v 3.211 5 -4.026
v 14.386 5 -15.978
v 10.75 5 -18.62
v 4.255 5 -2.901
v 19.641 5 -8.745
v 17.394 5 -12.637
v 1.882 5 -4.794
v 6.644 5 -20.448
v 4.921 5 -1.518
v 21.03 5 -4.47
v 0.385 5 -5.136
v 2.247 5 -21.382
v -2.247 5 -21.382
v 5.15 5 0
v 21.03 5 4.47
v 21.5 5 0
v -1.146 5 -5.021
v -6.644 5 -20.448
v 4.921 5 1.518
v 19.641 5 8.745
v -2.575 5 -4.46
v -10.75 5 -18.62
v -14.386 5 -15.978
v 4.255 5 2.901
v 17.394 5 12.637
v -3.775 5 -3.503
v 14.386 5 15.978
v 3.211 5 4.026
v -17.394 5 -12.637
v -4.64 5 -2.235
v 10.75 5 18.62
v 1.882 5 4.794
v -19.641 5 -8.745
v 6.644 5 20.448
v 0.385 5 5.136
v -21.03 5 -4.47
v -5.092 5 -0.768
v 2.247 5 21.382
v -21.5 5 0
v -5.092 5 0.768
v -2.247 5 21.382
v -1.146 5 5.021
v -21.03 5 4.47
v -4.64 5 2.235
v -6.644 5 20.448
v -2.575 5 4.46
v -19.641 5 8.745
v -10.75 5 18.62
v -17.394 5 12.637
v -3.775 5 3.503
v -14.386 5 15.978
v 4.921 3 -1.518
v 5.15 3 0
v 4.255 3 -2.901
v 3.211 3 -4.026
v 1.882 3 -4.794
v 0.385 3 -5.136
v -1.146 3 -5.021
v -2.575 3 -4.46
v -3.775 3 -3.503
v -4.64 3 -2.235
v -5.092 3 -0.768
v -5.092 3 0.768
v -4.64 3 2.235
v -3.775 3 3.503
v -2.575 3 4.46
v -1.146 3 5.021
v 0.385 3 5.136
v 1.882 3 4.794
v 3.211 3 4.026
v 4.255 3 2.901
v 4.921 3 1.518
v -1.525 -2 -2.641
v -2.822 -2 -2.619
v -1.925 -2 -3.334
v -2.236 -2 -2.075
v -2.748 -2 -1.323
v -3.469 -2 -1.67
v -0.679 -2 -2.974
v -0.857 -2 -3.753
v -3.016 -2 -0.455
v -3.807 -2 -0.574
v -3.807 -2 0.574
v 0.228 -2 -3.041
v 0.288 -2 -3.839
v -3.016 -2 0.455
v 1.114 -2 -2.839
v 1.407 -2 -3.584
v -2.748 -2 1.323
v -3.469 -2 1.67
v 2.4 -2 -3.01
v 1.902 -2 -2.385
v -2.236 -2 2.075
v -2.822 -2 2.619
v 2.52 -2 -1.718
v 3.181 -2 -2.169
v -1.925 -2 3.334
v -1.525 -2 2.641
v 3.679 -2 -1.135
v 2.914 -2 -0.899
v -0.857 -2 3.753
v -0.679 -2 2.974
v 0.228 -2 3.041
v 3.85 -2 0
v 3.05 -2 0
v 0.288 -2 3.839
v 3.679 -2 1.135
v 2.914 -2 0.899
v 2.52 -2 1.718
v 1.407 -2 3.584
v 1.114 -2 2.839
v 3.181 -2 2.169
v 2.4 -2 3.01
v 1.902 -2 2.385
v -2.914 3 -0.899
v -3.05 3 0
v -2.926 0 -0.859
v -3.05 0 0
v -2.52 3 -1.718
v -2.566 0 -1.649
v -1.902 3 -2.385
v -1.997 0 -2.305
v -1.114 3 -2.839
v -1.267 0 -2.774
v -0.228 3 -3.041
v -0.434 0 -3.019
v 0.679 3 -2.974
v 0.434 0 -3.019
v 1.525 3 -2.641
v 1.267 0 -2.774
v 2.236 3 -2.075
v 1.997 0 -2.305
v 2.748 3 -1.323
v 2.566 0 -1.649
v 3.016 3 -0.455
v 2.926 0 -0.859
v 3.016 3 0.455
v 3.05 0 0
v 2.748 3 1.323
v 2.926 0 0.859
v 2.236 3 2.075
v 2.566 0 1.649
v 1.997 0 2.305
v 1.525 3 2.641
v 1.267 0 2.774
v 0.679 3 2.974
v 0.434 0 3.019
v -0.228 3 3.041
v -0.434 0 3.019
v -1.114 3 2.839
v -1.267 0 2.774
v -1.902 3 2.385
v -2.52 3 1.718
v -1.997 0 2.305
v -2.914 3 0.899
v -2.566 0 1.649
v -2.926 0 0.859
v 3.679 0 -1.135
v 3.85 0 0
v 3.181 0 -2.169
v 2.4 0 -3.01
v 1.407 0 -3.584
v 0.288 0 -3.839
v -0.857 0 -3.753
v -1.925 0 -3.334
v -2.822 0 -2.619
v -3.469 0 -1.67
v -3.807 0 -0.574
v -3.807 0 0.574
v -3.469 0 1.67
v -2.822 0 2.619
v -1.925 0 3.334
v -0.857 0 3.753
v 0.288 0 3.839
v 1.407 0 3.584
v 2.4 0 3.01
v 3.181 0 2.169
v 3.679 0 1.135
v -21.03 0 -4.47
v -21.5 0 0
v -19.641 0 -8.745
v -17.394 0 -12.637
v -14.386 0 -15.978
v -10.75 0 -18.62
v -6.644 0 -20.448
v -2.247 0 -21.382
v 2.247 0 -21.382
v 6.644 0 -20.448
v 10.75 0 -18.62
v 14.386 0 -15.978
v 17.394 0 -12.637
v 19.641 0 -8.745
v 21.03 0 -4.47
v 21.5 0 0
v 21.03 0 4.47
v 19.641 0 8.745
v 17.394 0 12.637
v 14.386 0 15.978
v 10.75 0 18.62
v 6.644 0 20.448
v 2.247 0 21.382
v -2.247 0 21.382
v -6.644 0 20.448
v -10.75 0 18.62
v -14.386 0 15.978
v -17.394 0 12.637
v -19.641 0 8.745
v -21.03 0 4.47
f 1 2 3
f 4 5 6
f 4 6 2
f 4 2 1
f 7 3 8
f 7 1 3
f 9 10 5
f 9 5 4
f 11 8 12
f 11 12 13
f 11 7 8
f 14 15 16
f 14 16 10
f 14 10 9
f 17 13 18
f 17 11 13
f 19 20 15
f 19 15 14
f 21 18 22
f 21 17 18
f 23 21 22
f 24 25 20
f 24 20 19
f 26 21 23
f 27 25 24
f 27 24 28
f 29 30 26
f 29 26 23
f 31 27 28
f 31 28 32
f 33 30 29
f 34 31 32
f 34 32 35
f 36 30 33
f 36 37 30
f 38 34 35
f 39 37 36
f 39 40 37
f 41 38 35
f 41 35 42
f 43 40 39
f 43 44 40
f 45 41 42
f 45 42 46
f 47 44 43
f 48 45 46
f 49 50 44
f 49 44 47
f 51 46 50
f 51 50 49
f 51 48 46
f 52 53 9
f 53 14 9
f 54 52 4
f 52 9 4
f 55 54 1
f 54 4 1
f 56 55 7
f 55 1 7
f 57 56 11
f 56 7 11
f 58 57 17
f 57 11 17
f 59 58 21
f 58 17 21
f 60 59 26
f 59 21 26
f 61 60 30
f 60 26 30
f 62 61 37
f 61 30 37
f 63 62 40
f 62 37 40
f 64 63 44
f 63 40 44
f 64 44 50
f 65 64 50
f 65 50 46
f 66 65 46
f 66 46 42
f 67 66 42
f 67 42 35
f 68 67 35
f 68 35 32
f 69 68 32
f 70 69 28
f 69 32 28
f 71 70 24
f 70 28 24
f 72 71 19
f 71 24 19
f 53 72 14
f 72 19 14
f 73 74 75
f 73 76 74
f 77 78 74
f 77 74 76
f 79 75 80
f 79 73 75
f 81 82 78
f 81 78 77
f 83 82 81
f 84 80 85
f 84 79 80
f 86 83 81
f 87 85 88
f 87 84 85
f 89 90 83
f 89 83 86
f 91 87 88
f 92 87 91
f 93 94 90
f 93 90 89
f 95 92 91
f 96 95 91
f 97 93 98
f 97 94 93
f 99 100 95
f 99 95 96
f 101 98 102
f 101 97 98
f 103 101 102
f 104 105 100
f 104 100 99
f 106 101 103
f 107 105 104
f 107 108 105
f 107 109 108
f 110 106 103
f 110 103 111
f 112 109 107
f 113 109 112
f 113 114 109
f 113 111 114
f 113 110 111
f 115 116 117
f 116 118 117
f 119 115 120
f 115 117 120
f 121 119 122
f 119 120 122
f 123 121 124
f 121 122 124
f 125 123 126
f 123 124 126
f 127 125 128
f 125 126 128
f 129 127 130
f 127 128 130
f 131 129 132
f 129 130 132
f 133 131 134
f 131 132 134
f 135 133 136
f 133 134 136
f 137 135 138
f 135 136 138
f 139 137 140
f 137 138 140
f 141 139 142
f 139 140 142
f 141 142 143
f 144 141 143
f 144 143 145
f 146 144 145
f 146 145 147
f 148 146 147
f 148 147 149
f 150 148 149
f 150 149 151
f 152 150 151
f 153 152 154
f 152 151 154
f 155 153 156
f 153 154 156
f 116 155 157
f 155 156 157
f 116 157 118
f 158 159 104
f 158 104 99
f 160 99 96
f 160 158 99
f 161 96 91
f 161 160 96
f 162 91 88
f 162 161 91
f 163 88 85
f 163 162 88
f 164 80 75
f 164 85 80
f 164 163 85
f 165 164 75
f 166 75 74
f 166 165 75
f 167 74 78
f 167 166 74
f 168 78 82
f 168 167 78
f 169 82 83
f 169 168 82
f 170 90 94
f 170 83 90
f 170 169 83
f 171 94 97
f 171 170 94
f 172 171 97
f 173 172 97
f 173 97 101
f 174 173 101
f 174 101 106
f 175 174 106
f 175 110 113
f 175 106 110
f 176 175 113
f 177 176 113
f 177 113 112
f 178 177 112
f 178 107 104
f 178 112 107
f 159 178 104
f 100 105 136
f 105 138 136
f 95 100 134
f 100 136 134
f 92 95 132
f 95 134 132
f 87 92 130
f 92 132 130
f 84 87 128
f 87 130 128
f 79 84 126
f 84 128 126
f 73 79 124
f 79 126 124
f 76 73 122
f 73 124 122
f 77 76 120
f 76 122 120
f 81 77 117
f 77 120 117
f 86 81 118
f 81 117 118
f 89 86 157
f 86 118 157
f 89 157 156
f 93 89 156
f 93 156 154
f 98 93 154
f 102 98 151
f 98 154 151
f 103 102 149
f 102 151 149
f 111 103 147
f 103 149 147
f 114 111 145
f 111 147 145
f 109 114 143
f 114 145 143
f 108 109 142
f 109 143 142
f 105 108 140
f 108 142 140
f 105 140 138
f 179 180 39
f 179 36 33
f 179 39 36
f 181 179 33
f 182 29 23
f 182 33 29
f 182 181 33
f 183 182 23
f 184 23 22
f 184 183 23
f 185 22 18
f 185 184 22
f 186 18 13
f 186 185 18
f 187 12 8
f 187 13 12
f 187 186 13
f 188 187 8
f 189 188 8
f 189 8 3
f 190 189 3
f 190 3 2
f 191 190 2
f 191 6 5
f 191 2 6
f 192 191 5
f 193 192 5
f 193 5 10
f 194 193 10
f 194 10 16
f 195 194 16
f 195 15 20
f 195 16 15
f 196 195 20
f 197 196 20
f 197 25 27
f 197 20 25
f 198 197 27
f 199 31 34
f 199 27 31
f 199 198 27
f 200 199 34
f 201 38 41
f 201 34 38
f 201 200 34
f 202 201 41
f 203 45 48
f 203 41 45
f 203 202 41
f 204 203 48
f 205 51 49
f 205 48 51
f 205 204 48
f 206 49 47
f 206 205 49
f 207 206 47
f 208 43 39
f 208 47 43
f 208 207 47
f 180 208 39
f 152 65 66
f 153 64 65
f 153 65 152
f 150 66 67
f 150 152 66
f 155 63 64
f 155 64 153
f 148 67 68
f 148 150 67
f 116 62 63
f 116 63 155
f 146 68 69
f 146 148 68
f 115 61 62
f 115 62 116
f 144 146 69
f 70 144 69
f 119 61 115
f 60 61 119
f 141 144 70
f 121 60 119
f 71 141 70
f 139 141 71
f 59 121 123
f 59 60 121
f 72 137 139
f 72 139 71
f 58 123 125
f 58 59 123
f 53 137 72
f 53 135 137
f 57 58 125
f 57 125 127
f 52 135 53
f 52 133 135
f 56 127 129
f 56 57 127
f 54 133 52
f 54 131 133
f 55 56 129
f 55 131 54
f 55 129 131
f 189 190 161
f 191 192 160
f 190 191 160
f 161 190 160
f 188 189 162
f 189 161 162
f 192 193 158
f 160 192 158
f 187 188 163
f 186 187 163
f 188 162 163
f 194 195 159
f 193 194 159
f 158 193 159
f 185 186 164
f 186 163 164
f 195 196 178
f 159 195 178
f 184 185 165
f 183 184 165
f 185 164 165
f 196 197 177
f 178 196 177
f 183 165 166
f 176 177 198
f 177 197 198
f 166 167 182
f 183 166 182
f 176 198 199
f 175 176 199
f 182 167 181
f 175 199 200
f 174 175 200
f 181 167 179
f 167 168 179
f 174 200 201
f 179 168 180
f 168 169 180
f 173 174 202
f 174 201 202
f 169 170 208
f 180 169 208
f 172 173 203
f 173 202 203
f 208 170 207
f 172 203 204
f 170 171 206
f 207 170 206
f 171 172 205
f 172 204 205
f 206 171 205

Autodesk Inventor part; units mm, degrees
ref_plane "YZ Plane" through (0, 0, 0) normal (1, 0, 0) x (0, 1, 0)
ref_plane "XZ Plane" through (0, 0, 0) normal (0, 1, 0) x (-1, 0, 0)
ref_plane "XY Plane" through (0, 0, 0) normal (0, 0, 1) x (1, 0, 0)
sketch "Boceto1" plane through (0, 0, 0) normal (0, 1, 0) x (-1, 0, 0)
  circle A0 centre (0, 0) radius 21.5
  circle A1 centre (0, 0) radius 3.05
  dimension "d0" = 43
  dimension "d1" = 6.1
extrude "Extrusión1" add sketch "Boceto1" along normal blind 5
sketch "Boceto2" plane through (0, 5, 0) normal (0, 1, 0) x (1, 0, 0)
  circle A0 centre (0, 0) radius 5.15
  dimension "d4" = 10.3
extrude "Extrusión2" cut sketch "Boceto2" against normal blind 2
sketch "Boceto5" plane through (0, 0, 0) normal (0, -1, 0) x (1, 0, 0)
  circle A0 centre (0, 0) radius 3.85
  circle A1 centre (0, 0) radius 3.05 projected
  dimension "d9" = 7.7
extrude "Extrusión3" add sketch "Boceto5" along normal blind 2
properties part number "Pulley Top"
